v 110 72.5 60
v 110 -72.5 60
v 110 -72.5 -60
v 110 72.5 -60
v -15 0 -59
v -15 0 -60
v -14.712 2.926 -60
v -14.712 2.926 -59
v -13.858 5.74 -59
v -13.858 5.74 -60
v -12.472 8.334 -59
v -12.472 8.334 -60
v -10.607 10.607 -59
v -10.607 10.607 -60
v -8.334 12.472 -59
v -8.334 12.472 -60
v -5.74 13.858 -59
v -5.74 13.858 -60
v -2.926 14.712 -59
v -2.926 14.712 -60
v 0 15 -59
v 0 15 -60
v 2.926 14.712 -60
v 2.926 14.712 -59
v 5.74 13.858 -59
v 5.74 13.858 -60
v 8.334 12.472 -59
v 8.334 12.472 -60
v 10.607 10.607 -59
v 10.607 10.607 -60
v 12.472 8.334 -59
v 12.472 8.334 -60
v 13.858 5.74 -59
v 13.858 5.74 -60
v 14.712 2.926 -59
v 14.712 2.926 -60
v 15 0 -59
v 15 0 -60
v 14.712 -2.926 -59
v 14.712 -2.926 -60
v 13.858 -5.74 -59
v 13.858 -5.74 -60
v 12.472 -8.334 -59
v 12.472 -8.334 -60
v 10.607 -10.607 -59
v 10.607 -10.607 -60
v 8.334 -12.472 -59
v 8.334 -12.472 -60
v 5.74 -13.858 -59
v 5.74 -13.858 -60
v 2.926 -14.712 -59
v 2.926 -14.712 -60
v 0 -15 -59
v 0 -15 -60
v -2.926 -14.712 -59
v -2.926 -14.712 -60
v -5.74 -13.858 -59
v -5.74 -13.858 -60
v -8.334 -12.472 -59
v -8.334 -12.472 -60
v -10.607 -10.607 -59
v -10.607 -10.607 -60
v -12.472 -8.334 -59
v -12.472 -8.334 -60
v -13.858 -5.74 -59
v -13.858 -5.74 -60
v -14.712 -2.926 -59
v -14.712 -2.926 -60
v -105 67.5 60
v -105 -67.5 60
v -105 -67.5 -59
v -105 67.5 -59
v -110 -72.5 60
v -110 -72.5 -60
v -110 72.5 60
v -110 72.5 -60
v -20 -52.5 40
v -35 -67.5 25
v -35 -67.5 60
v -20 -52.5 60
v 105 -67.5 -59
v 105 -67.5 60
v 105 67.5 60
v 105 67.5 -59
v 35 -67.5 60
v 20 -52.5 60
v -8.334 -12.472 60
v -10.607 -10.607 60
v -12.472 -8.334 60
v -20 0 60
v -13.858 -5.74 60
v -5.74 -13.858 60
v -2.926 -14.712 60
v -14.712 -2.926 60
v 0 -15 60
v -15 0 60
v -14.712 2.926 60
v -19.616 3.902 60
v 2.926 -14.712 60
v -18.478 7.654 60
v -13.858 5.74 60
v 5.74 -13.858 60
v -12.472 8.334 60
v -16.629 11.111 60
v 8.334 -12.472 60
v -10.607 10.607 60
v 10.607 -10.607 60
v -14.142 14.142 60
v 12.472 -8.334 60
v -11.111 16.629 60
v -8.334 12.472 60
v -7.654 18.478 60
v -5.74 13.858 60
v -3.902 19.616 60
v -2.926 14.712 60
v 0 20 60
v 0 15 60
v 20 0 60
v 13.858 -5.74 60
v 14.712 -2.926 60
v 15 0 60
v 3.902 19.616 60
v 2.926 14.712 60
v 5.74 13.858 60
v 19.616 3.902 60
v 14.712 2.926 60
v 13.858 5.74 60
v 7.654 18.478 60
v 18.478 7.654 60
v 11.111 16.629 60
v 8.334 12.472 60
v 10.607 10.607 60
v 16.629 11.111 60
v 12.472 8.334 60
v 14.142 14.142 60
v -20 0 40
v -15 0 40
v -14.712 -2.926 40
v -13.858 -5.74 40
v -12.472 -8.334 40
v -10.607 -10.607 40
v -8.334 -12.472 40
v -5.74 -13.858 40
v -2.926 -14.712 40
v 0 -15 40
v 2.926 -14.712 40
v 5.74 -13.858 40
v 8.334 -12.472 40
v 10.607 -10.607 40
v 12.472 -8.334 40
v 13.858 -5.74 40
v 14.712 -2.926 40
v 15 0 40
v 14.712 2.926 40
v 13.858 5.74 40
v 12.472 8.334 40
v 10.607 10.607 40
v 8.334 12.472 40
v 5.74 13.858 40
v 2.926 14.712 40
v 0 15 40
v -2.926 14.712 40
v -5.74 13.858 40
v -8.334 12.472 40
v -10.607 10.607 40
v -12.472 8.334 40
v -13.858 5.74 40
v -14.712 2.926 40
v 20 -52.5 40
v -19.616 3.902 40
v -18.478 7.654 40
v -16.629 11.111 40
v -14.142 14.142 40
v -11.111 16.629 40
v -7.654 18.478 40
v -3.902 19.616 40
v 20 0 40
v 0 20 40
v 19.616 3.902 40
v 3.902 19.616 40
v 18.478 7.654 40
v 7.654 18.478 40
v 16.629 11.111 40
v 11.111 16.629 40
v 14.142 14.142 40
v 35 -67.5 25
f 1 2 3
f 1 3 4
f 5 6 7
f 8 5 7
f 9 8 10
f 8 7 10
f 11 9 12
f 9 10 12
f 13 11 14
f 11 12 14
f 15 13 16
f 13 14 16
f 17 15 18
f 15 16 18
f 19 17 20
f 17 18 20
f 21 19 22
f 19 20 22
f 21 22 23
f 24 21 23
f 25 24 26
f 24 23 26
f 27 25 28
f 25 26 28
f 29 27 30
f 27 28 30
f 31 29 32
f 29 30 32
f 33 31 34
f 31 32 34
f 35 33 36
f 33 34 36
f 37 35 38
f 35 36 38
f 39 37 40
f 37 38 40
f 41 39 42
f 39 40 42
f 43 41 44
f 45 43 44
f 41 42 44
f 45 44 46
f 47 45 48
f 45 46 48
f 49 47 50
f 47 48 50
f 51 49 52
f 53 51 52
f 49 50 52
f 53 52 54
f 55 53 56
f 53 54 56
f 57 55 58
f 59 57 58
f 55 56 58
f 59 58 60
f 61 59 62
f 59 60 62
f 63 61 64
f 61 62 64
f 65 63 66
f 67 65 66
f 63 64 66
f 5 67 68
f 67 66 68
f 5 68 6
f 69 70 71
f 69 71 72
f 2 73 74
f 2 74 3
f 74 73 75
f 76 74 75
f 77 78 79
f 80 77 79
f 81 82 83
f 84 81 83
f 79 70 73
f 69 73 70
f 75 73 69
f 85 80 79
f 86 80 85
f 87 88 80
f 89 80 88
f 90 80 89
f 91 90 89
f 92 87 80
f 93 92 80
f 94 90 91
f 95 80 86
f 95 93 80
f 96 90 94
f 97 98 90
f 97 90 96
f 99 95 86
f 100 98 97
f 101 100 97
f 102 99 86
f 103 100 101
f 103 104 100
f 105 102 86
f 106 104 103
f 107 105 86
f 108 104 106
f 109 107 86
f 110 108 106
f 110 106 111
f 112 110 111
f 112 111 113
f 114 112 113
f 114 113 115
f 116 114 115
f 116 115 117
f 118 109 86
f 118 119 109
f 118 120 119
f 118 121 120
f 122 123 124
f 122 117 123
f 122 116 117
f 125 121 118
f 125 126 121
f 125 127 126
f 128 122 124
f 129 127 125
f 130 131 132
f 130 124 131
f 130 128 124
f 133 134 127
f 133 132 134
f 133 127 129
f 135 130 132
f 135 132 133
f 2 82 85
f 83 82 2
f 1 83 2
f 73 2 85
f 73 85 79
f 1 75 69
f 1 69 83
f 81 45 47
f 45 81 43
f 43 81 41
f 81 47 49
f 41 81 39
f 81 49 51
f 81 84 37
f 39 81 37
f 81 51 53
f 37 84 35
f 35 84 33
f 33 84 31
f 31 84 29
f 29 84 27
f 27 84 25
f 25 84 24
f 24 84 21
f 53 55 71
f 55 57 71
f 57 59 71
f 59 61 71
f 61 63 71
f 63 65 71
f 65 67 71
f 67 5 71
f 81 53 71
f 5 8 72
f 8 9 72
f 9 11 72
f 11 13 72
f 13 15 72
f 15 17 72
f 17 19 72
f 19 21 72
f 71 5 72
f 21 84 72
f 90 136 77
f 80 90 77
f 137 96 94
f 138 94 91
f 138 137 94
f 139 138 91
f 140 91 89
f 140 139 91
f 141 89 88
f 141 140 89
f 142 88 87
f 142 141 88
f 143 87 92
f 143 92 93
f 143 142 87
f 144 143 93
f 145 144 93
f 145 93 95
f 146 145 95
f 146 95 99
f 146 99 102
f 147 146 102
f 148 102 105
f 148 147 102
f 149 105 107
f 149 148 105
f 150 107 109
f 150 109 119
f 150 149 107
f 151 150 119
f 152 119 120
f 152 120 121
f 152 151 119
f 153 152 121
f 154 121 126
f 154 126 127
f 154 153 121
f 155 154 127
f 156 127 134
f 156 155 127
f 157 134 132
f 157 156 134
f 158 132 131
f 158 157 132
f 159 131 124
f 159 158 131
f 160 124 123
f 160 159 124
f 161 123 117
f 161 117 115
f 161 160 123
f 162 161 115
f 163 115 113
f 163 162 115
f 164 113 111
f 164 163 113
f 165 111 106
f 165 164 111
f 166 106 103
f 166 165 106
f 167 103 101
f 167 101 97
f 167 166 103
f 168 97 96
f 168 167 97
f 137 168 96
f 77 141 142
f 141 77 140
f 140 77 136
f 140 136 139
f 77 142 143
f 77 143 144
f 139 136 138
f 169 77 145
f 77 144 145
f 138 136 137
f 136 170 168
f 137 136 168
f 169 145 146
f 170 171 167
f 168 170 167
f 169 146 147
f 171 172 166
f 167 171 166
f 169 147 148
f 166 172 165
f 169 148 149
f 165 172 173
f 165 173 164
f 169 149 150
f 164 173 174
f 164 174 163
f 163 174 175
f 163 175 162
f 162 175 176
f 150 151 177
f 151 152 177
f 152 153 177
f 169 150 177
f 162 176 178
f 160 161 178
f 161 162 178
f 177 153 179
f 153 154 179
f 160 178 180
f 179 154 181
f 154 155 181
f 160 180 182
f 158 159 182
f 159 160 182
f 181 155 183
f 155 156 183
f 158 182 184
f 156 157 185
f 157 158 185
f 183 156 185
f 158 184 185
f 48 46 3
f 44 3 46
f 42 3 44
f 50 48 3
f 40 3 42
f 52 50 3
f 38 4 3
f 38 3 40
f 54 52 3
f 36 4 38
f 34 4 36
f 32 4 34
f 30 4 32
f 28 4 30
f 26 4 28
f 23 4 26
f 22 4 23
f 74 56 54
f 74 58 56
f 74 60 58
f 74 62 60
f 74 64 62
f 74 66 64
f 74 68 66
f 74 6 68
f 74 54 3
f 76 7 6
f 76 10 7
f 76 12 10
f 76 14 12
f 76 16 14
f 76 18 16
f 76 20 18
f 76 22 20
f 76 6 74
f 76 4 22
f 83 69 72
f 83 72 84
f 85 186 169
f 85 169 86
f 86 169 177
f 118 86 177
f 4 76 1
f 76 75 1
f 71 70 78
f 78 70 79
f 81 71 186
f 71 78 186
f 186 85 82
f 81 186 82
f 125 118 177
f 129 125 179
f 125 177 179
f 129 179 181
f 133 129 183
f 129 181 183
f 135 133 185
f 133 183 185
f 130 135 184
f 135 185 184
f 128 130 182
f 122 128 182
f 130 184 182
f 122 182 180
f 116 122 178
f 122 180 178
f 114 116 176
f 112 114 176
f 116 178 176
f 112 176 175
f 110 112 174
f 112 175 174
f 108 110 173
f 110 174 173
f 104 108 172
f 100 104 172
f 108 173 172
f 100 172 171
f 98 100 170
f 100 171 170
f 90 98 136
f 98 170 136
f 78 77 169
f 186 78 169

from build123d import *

# Parameters (mm, degrees)
ESBO_O1_W                = 220
ESBO_O1_H                = 145
ESBO_O1_W_2              = 210
ESBO_O1_H_2              = 135
RESSALTO_EXTRUS_O1_DEPTH = 60
ESBO_O3_W                = 210
ESBO_O3_H                = 135
ESBO_O3_R                = 15
RESSALTO_EXTRUS_O3_DEPTH = 1
RESSALTO_EXTRUS_O8_START = -20
ESBO_O14_R               = 15
RESSALTO_EXTRUS_O8_DEPTH = 20
CHANFRO4_SIZE            = 15


with BuildPart() as part:
    # Esboço1 → Ressalto-extrusão1 (new, symmetric)
    with BuildSketch(Plane.XY):
        Rectangle(ESBO_O1_W, ESBO_O1_H)
        Rectangle(ESBO_O1_W_2, ESBO_O1_H_2, mode=Mode.SUBTRACT)
    extrude(amount=RESSALTO_EXTRUS_O1_DEPTH, both=True)

    # Esboço3 → Ressalto-extrusão3 (add)
    with BuildSketch(Plane(origin=(0, 0, -60), x_dir=(-1, 0, 0), z_dir=(0, 0, -1))):
        Rectangle(ESBO_O3_W, ESBO_O3_H)
        Circle(ESBO_O3_R, mode=Mode.SUBTRACT)
    extrude(amount=-RESSALTO_EXTRUS_O3_DEPTH)

    # Esboço14 → Ressalto-extrusão8 (add)
    with BuildSketch(Plane.XY.offset(60).offset(RESSALTO_EXTRUS_O8_START)):
        with BuildLine():
            Line((-20, 0), (-20, -67.5))
            Line((-20, -67.5), (20, -67.5))
            Line((20, -67.5), (20, 0))
            ThreePointArc((20, 0), (0, 20), (-20, 0))
        make_face()
        with Locations(Location((0, 0, 0), (0, 0, 180))):
            Circle(ESBO_O14_R, mode=Mode.SUBTRACT)
    extrude(amount=RESSALTO_EXTRUS_O8_DEPTH)

    # Chanfro4
    chanfro4_edges = [part.edges().sort_by_distance(p)[0] for p in [
        (0, -67.5, 40),
        (20, -67.5, 50),
        (-20, -67.5, 50),
    ]]
    chamfer(chanfro4_edges, length=CHANFRO4_SIZE)


solid = part.part
